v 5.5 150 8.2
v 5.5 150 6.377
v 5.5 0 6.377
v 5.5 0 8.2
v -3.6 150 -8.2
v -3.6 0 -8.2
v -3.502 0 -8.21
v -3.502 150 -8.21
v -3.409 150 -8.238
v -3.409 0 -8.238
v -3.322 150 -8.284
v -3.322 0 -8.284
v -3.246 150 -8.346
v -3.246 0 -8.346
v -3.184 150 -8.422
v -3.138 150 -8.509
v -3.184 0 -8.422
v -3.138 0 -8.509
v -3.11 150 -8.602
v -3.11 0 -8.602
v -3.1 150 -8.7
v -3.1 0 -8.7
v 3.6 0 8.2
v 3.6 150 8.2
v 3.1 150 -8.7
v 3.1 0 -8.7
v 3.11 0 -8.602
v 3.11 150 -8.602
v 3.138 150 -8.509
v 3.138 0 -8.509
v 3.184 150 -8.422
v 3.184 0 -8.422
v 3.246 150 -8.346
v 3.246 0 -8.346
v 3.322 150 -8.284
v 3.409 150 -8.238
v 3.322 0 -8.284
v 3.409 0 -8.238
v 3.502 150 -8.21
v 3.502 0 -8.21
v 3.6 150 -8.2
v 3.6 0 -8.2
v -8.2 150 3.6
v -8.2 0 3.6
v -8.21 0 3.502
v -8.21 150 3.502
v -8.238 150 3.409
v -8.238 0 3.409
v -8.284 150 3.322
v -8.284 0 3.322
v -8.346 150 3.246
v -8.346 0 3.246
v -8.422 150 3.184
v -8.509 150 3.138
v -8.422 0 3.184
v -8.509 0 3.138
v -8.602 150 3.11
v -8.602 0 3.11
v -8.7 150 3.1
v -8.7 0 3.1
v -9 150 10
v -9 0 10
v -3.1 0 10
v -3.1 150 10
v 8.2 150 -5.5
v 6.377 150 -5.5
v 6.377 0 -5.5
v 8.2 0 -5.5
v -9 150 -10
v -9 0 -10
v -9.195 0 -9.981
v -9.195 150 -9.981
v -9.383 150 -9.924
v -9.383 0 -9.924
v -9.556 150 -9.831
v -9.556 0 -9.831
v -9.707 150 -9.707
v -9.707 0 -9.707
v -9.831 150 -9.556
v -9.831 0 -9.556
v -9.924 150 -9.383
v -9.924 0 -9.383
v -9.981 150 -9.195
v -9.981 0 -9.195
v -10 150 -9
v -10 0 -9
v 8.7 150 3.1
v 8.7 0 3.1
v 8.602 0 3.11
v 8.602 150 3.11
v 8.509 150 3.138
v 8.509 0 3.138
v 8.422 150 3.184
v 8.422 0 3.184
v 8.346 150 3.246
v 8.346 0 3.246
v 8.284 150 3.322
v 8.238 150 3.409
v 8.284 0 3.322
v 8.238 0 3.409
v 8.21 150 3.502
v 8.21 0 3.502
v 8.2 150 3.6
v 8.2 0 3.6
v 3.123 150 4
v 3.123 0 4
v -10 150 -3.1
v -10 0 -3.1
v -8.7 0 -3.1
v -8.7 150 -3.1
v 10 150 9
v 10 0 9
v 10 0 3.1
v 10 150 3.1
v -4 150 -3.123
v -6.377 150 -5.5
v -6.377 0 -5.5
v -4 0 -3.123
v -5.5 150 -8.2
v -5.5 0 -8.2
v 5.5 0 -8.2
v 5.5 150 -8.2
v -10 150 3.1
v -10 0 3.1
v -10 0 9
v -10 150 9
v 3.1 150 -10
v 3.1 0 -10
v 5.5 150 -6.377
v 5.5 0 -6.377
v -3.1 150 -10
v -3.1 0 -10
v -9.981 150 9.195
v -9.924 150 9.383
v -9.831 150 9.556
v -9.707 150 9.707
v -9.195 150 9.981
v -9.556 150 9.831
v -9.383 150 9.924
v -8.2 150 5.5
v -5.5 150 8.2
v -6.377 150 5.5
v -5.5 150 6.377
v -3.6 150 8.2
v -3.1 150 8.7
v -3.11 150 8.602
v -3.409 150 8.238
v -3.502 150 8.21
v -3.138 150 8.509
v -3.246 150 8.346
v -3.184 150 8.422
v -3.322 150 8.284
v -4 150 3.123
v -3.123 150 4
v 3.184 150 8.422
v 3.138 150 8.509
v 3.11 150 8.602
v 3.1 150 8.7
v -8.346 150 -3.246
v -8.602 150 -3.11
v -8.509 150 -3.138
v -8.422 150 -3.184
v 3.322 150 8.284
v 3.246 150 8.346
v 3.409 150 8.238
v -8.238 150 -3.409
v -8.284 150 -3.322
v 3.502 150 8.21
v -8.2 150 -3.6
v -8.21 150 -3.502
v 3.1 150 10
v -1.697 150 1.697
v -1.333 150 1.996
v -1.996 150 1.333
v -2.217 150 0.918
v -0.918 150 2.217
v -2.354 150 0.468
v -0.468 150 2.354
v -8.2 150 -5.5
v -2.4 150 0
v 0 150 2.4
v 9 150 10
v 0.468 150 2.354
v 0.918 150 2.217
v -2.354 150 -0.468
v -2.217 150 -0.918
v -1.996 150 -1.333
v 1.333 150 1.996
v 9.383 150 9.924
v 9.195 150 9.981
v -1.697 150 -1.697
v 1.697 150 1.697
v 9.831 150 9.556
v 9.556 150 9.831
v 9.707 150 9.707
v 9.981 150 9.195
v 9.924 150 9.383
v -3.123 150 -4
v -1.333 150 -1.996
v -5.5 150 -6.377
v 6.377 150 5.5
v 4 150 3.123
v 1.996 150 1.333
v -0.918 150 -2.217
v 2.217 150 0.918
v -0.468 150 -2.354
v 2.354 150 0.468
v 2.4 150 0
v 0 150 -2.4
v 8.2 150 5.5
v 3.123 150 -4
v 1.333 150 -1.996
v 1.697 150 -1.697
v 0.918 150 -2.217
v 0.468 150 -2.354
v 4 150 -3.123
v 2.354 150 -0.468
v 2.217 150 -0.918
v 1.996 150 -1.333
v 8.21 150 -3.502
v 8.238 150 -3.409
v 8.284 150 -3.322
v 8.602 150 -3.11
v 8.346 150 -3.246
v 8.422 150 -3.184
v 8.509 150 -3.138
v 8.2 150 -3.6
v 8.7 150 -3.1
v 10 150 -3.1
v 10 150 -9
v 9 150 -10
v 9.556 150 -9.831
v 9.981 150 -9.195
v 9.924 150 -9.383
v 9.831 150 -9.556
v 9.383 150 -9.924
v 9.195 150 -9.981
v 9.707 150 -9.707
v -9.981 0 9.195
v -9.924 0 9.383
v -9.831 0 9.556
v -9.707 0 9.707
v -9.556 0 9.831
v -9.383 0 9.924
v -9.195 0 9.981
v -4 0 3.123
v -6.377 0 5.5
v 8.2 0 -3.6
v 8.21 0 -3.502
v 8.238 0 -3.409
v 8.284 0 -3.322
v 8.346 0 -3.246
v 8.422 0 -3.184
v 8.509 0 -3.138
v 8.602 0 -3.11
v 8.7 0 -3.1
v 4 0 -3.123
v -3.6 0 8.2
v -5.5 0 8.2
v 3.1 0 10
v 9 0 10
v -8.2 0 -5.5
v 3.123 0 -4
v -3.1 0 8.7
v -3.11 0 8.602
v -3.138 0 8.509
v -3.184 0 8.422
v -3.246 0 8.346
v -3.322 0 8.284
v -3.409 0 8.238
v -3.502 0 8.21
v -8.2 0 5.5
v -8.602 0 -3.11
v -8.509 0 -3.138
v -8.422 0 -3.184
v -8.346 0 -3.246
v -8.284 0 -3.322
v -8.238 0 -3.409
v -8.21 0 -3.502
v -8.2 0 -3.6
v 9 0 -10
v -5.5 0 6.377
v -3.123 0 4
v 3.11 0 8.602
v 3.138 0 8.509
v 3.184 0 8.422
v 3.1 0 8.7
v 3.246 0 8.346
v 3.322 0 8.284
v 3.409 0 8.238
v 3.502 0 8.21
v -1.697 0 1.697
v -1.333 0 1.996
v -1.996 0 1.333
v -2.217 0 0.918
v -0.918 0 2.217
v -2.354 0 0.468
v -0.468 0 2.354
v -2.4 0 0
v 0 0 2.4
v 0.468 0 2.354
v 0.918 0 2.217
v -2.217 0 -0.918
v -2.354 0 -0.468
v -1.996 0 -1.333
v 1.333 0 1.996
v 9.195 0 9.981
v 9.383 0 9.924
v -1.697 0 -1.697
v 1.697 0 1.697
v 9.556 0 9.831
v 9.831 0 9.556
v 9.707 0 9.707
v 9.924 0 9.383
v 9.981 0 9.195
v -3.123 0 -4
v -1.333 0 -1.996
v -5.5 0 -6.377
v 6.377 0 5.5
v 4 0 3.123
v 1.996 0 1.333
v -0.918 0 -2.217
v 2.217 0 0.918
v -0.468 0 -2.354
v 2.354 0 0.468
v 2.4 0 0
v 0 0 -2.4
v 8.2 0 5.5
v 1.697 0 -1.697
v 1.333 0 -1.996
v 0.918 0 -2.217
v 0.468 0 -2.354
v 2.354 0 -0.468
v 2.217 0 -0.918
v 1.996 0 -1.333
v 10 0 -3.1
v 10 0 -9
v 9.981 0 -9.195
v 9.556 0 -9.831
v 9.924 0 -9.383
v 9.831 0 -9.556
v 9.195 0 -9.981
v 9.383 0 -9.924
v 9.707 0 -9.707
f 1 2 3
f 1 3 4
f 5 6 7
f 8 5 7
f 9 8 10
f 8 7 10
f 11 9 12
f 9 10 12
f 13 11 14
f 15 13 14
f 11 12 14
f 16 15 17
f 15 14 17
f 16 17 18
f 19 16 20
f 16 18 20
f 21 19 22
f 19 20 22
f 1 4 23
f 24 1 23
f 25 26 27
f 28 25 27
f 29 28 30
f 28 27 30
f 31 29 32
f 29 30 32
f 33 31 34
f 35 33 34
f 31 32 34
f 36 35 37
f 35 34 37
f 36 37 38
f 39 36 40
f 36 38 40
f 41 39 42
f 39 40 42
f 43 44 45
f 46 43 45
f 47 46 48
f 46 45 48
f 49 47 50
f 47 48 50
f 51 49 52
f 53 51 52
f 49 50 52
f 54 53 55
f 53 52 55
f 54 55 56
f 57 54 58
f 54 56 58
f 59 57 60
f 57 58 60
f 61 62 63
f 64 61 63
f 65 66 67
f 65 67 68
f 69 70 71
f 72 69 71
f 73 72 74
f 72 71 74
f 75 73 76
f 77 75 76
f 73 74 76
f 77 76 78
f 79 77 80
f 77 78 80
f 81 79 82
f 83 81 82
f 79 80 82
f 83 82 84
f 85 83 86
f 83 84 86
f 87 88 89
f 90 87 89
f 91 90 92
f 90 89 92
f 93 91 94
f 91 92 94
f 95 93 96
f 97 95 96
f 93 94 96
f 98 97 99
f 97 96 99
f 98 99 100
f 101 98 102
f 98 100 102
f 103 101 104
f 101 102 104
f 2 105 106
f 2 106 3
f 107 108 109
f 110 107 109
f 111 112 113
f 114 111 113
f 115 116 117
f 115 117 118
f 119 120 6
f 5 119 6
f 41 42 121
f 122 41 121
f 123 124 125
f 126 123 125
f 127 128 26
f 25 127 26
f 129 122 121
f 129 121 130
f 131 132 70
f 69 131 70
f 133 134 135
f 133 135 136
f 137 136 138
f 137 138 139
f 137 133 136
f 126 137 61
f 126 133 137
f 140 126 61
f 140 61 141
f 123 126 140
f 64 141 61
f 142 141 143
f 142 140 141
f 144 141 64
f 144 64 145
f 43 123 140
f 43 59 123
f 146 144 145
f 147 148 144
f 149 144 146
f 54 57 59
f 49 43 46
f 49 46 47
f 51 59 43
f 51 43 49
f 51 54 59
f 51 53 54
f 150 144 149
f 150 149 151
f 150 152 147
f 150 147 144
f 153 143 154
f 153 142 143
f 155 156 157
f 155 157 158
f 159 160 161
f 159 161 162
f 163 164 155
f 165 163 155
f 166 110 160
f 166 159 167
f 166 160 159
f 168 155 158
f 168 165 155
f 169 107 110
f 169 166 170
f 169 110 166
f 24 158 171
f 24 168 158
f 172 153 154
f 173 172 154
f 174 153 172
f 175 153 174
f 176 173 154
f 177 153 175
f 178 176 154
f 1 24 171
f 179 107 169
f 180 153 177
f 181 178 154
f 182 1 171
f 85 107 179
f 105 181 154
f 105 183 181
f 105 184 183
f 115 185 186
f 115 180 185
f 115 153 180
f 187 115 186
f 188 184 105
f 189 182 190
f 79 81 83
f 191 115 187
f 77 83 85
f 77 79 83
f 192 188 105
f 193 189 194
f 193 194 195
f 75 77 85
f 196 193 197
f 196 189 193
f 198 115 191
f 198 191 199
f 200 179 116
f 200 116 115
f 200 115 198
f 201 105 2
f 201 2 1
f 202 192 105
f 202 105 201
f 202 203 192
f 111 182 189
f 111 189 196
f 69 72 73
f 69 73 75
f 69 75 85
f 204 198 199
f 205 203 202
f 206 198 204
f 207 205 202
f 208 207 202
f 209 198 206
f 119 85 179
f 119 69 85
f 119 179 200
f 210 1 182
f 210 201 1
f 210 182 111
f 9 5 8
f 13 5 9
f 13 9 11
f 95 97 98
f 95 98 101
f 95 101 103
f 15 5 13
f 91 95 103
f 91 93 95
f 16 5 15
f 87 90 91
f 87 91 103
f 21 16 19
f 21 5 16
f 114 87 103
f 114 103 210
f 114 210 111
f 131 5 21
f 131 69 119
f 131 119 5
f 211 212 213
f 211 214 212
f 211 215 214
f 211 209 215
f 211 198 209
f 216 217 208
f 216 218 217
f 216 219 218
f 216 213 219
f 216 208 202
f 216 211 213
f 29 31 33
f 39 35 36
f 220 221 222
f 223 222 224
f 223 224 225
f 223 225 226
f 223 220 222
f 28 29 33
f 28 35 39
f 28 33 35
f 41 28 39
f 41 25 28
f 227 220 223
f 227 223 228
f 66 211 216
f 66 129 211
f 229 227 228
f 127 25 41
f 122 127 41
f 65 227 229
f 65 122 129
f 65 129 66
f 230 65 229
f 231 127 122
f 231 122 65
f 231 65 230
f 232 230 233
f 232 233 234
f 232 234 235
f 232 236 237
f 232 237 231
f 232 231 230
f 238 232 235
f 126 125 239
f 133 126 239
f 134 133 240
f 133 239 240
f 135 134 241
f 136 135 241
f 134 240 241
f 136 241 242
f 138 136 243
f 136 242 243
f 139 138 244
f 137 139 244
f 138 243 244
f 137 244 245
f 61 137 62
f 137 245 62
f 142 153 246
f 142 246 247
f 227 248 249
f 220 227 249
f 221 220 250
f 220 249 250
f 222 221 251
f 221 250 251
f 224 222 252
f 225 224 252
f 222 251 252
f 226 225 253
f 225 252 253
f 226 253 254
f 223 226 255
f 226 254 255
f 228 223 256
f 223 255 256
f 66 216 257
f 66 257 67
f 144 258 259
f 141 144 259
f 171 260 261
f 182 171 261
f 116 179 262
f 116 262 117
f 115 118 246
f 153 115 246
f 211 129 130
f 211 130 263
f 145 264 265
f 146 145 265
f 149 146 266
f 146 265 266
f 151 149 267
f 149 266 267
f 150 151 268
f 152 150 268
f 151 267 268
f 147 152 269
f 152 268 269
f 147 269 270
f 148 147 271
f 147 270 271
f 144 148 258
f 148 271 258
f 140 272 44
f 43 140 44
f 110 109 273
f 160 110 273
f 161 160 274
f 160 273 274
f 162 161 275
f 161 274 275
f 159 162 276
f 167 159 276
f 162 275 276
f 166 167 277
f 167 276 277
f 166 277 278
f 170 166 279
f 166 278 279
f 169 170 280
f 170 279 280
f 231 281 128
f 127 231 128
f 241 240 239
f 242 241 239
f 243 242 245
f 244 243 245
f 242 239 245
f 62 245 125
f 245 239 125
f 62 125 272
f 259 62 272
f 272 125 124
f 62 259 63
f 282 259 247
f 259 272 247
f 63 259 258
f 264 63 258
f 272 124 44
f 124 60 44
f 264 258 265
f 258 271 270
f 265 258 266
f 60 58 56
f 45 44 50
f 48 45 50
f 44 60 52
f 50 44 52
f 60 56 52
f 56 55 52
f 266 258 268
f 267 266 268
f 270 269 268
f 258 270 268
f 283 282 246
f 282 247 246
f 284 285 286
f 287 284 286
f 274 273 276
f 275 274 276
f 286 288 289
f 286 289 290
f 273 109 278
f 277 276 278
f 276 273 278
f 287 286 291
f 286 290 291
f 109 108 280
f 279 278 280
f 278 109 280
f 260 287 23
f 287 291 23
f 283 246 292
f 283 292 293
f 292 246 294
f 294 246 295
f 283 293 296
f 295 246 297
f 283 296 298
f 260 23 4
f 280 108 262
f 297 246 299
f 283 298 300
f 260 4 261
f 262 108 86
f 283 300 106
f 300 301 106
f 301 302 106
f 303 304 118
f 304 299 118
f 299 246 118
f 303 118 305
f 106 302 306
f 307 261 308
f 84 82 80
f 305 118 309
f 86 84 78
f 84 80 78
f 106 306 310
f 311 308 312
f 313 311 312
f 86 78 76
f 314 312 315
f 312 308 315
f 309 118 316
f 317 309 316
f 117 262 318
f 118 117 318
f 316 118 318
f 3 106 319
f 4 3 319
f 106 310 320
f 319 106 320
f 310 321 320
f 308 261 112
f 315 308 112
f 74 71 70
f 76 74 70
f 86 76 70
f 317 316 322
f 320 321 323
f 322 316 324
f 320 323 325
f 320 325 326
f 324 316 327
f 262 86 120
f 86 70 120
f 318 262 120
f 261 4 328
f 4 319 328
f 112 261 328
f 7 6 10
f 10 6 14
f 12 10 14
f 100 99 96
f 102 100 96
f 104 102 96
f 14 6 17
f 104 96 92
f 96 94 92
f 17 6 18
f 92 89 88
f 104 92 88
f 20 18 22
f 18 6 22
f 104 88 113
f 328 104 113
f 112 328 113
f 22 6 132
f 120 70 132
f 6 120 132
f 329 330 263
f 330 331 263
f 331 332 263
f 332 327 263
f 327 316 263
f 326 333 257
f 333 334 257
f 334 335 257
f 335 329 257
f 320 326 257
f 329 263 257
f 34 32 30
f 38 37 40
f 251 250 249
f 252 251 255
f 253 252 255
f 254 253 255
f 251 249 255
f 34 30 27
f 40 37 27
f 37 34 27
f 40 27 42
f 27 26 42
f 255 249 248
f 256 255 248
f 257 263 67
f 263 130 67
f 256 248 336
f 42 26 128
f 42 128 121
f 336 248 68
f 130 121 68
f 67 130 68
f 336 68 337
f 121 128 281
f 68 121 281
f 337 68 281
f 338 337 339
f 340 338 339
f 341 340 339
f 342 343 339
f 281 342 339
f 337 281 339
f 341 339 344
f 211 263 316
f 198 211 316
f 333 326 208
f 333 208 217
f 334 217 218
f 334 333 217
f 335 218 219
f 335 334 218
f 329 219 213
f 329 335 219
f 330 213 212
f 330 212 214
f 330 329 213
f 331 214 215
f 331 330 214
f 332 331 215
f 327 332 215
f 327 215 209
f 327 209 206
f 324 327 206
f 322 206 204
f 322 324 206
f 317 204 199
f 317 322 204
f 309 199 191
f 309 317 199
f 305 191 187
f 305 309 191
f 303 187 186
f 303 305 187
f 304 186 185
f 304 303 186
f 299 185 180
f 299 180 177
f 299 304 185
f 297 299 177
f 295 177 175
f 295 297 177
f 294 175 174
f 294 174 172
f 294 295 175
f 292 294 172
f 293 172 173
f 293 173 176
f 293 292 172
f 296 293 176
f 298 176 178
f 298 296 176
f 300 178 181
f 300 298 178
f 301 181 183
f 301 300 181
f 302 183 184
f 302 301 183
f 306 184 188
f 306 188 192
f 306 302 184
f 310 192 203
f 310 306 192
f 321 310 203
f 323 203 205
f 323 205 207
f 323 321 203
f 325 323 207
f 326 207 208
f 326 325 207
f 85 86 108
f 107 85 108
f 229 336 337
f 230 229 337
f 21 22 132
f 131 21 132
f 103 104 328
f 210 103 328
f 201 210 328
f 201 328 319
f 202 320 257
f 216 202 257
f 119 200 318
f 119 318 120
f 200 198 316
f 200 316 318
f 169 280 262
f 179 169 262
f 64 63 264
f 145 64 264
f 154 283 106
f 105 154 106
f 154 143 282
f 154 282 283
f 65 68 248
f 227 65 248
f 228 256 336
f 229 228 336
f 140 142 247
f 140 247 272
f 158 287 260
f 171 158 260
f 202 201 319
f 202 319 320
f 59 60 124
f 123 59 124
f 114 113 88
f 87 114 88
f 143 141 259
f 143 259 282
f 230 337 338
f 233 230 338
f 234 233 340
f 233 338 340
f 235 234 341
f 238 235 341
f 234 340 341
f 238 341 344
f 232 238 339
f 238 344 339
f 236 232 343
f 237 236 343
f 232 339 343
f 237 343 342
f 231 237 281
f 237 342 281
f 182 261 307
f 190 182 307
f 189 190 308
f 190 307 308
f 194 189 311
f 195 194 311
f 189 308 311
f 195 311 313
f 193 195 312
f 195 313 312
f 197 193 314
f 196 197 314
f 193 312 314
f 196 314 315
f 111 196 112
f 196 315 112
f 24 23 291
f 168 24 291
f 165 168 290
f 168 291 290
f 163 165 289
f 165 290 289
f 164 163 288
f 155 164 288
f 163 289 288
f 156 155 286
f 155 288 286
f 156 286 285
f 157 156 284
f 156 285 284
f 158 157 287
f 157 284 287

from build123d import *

# Parameters (mm, degrees)
SKETCH1_R           = 2.4
BOSS_EXTRUDE1_DEPTH = 150


with BuildPart() as part:
    # Sketch1 → Boss-Extrude1 (new body)
    with BuildSketch(Plane(origin=(0, 0, 0), x_dir=(1, 0, 0), z_dir=(0, 1, 0))):
        with BuildLine():
            ThreePointArc((-10, -9), (-9.707106781, -9.707106781), (-9, -10))
            Line((-9, -10), (-3.1, -10))
            Line((-3.1, -10), (-3.1, -8.7))
            ThreePointArc((-3.1, -8.7), (-3.246446609, -8.346446609), (-3.6, -8.2))
            Line((-3.6, -8.2), (-5.5, -8.2))
            Line((-5.5, -8.2), (-5.5, -6.376528763))
            Line((-5.5, -6.376528763), (-3.123471237, -4))
            Line((-3.123471237, -4), (0, -4))
            Line((0, -4), (3.123471237, -4))
            Line((3.123471237, -4), (5.5, -6.376528763))
            Line((5.5, -6.376528763), (5.5, -8.2))
            Line((5.5, -8.2), (3.6, -8.2))
            ThreePointArc((3.6, -8.2), (3.246446609, -8.346446609), (3.1, -8.7))
            Line((3.1, -8.7), (3.1, -10))
            Line((3.1, -10), (9, -10))
            ThreePointArc((9, -10), (9.707106781, -9.707106781), (10, -9))
            Line((10, -9), (10, -3.1))
            Line((10, -3.1), (8.7, -3.1))
            ThreePointArc((8.7, -3.1), (8.346446609, -3.246446609), (8.2, -3.6))
            Line((8.2, -3.6), (8.2, -5.5))
            Line((8.2, -5.5), (6.376528763, -5.5))
            Line((6.376528763, -5.5), (4, -3.123471237))
            Line((4, -3.123471237), (4, 0))
            Line((4, 0), (4, 3.123471237))
            Line((4, 3.123471237), (6.376528763, 5.5))
            Line((6.376528763, 5.5), (8.2, 5.5))
            Line((8.2, 5.5), (8.2, 3.6))
            ThreePointArc((8.2, 3.6), (8.346446609, 3.246446609), (8.7, 3.1))
            Line((8.7, 3.1), (10, 3.1))
            Line((10, 3.1), (10, 9))
            ThreePointArc((10, 9), (9.707106781, 9.707106781), (9, 10))
            Line((9, 10), (3.1, 10))
            Line((3.1, 10), (3.1, 8.7))
            ThreePointArc((3.1, 8.7), (3.246446609, 8.346446609), (3.6, 8.2))
            Line((3.6, 8.2), (5.5, 8.2))
            Line((5.5, 8.2), (5.5, 6.376528763))
            Line((5.5, 6.376528763), (3.123471237, 4))
            Line((3.123471237, 4), (0, 4))
            Line((0, 4), (-3.123471237, 4))
            Line((-3.123471237, 4), (-5.5, 6.376528763))
            Line((-5.5, 6.376528763), (-5.5, 8.2))
            Line((-5.5, 8.2), (-3.6, 8.2))
            ThreePointArc((-3.6, 8.2), (-3.246446609, 8.346446609), (-3.1, 8.7))
            Line((-3.1, 8.7), (-3.1, 10))
            Line((-3.1, 10), (-9, 10))
            ThreePointArc((-9, 10), (-9.707106781, 9.707106781), (-10, 9))
            Line((-10, 9), (-10, 3.1))
            Line((-10, 3.1), (-8.7, 3.1))
            ThreePointArc((-8.7, 3.1), (-8.346446609, 3.246446609), (-8.2, 3.6))
            Line((-8.2, 3.6), (-8.2, 5.5))
            Line((-8.2, 5.5), (-6.376528763, 5.5))
            Line((-6.376528763, 5.5), (-4, 3.123471237))
            Line((-4, 3.123471237), (-4, 0))
            Line((-4, 0), (-4, -3.123471237))
            Line((-4, -3.123471237), (-6.376528763, -5.5))
            Line((-6.376528763, -5.5), (-8.2, -5.5))
            Line((-8.2, -5.5), (-8.2, -3.6))
            ThreePointArc((-8.2, -3.6), (-8.346446609, -3.246446609), (-8.7, -3.1))
            Line((-8.7, -3.1), (-10, -3.1))
            Line((-10, -3.1), (-10, -9))
        make_face()
        Circle(SKETCH1_R, mode=Mode.SUBTRACT)
    extrude(amount=BOSS_EXTRUDE1_DEPTH)


solid = part.part
